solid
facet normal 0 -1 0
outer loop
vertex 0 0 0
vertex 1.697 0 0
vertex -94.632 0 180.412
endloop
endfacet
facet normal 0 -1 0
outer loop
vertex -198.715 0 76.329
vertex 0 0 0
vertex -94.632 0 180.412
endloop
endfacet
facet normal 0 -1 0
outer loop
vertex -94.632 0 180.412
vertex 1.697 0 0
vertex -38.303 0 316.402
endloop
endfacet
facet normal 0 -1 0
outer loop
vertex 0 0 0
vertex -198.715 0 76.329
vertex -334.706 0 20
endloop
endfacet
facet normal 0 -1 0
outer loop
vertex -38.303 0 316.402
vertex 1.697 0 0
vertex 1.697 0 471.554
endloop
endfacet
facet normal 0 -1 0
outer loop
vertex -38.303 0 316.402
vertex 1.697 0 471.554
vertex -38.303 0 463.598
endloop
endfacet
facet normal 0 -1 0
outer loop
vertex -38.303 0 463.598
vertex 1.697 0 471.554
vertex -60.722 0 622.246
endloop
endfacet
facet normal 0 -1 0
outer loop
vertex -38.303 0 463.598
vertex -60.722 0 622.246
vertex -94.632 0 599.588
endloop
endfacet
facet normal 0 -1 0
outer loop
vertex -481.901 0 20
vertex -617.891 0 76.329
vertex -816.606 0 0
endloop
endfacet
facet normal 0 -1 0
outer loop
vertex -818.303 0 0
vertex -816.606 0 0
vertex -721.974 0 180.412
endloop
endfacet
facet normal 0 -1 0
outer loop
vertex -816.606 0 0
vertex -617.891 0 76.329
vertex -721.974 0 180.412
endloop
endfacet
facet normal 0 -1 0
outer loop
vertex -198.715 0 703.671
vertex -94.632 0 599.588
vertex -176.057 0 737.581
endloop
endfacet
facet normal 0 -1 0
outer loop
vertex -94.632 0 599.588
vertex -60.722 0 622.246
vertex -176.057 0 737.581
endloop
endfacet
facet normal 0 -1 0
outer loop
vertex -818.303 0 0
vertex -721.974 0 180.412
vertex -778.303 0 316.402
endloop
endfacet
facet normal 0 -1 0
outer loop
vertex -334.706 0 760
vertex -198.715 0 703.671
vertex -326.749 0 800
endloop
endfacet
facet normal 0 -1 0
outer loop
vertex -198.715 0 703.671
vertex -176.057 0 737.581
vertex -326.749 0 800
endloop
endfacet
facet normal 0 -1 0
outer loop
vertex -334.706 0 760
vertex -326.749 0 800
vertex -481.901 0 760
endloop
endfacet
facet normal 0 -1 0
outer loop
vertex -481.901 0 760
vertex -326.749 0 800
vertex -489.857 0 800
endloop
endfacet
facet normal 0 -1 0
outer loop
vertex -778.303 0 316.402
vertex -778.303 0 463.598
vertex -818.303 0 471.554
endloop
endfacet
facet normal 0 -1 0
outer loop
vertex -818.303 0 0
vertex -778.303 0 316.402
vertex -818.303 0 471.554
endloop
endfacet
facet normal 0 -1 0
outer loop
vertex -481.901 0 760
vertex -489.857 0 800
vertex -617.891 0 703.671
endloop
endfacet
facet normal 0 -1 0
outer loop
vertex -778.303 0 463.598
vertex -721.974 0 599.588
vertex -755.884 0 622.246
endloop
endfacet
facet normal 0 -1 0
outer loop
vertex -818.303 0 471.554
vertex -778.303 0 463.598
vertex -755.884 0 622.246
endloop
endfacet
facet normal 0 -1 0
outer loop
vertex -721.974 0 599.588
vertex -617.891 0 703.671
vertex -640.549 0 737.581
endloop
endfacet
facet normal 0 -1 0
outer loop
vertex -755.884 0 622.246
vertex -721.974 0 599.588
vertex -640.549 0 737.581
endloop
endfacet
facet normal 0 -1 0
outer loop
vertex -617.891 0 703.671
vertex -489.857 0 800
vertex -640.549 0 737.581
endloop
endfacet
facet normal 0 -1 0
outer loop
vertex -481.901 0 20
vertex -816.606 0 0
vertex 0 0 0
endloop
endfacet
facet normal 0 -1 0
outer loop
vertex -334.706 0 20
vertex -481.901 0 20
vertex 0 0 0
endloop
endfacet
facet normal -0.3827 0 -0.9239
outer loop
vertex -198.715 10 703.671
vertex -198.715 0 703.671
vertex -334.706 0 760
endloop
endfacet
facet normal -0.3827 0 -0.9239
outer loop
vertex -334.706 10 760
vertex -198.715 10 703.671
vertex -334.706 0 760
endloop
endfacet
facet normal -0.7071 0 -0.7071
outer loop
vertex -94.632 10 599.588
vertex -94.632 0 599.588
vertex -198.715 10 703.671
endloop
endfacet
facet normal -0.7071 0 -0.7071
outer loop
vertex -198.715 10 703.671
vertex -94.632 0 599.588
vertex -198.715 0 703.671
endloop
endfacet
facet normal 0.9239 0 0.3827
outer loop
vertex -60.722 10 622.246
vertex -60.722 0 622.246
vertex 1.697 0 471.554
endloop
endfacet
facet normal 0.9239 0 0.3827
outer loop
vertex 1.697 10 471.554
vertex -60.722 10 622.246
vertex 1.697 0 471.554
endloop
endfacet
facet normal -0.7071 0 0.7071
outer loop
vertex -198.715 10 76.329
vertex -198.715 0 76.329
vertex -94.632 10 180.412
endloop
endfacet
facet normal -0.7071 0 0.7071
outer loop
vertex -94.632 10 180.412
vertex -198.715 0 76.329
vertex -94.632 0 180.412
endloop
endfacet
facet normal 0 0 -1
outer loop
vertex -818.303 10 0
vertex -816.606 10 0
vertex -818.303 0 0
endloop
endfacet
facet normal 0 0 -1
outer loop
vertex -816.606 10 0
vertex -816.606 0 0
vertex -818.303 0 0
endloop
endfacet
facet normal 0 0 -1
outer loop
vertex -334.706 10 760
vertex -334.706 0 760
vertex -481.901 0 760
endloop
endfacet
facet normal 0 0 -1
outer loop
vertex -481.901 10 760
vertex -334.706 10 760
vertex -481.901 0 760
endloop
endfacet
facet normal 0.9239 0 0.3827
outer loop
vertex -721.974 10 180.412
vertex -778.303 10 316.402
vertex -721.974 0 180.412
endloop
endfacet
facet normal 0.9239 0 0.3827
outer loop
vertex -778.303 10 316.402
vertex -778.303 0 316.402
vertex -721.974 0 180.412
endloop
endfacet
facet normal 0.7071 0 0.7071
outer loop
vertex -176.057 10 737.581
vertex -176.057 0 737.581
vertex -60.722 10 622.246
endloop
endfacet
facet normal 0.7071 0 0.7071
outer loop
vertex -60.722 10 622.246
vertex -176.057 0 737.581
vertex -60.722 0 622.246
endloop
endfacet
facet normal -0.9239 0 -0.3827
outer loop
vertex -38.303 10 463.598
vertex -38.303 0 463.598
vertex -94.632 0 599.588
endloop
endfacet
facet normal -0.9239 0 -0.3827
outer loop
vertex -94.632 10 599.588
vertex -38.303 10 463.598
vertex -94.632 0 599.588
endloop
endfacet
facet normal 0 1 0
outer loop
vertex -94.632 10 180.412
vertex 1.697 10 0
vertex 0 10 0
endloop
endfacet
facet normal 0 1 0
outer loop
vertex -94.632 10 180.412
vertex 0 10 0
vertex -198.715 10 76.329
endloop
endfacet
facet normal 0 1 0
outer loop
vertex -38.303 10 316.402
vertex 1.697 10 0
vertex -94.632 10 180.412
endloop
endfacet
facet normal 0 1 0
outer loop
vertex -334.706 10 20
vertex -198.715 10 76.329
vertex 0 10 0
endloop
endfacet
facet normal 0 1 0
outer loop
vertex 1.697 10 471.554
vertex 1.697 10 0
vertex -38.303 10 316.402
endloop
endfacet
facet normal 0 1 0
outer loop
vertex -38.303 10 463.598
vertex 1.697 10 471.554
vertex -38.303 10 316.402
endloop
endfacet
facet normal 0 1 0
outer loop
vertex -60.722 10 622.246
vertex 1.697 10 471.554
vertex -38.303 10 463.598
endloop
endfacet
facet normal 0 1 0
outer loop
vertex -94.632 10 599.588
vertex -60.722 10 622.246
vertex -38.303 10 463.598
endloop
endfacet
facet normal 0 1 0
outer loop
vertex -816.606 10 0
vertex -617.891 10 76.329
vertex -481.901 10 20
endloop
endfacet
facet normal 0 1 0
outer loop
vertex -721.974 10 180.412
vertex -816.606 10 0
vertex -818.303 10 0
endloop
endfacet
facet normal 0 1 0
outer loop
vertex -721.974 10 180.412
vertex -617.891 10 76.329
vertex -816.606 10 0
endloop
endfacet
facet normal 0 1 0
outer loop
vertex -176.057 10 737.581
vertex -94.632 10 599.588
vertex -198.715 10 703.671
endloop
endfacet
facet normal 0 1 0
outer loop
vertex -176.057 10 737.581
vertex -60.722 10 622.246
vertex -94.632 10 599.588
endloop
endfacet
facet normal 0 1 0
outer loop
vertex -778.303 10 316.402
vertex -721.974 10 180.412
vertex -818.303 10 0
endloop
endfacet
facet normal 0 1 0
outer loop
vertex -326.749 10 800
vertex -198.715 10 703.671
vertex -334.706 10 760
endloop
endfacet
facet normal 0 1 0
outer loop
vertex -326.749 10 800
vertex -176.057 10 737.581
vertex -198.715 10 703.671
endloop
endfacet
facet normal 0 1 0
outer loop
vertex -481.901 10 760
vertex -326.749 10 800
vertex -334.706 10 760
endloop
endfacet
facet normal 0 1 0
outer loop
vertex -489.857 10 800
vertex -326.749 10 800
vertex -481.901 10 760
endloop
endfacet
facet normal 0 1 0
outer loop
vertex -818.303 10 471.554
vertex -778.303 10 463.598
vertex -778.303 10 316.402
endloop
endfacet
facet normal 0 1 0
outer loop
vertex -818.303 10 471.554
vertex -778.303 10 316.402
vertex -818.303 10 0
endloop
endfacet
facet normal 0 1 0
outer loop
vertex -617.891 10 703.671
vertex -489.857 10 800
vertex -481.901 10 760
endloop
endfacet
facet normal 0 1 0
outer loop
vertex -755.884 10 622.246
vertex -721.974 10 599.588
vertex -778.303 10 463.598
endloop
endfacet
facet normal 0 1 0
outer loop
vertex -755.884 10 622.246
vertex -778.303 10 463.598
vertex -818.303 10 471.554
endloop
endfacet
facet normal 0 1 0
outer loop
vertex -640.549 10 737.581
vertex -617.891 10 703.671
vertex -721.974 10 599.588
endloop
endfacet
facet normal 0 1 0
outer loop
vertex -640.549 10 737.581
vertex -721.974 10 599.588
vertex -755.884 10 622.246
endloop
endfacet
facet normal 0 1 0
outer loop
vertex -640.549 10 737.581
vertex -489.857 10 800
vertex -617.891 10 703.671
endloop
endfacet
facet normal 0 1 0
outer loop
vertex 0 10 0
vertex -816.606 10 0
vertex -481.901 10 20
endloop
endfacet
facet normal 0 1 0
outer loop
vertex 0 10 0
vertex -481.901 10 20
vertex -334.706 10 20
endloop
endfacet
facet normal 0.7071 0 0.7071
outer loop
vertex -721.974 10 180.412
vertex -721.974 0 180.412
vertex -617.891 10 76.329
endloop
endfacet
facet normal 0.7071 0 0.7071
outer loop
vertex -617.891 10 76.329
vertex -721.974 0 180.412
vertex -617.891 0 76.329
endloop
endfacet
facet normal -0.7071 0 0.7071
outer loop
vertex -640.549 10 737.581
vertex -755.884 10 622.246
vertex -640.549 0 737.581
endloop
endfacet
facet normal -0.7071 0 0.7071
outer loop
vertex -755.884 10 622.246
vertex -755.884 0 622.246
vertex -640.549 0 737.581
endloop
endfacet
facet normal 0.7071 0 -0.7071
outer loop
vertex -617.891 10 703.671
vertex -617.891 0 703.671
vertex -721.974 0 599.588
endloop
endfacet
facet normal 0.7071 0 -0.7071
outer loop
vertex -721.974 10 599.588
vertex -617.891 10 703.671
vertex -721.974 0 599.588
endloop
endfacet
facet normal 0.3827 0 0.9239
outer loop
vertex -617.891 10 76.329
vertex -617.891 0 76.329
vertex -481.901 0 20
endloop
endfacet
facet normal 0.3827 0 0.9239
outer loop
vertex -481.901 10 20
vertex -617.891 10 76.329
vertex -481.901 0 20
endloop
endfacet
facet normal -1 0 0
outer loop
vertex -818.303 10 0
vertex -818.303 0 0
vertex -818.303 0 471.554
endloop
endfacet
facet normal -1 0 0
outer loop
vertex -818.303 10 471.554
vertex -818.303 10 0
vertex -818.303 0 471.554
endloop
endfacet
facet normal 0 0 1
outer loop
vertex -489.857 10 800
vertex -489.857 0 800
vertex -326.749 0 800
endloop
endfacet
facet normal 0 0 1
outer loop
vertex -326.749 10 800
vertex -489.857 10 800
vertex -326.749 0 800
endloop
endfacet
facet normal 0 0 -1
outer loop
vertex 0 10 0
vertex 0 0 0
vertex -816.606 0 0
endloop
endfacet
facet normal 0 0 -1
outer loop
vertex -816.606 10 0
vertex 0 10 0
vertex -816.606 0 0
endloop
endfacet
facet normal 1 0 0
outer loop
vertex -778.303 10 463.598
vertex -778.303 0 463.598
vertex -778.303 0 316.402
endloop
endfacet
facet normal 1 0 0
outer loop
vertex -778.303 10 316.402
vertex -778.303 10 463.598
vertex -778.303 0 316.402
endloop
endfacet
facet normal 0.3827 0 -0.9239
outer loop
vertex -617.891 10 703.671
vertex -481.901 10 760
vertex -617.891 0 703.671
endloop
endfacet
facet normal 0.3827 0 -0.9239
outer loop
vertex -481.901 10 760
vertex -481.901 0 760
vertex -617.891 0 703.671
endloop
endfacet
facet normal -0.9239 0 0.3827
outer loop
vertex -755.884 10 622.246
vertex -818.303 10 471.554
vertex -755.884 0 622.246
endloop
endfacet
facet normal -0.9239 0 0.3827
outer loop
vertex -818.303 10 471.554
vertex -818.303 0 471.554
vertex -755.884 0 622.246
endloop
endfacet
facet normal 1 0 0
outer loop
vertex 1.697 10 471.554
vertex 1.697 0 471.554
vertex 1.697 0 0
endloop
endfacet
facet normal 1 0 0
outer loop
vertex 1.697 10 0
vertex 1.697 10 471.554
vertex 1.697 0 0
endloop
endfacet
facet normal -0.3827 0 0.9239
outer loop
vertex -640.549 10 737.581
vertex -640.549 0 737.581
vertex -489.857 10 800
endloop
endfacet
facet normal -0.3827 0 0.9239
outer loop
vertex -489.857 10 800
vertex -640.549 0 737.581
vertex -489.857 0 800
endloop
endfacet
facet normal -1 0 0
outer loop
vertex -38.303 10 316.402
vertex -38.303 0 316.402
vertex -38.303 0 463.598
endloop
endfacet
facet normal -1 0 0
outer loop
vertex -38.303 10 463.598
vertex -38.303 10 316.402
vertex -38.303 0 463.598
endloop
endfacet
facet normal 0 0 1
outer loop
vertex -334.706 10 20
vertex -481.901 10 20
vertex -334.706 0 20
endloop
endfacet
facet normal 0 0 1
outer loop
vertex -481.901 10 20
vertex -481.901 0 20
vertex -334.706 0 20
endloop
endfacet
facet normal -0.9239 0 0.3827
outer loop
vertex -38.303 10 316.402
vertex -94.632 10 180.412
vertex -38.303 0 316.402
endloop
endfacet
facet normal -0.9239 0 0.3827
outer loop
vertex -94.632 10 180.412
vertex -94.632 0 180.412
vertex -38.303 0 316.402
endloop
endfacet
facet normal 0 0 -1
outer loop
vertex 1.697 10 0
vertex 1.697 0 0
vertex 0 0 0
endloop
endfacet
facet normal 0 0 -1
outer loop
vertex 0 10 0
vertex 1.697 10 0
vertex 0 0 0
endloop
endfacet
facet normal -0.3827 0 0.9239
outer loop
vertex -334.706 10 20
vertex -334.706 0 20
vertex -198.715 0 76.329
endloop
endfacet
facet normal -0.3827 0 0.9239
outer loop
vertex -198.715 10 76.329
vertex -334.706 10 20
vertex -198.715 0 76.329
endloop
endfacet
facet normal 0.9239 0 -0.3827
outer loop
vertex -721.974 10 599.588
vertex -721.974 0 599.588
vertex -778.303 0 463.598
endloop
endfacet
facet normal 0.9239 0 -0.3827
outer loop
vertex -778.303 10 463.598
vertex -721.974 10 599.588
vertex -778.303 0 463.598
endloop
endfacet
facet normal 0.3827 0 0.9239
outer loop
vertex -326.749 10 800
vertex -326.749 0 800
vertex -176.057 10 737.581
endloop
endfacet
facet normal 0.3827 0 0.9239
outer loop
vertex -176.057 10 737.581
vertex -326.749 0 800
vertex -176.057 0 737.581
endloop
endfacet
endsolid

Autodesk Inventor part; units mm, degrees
ref_plane "YZ Plane" through (0, 0, 0) normal (1, 0, 0) x (0, 1, 0)
ref_plane "XZ Plane" through (0, 0, 0) normal (0, 1, 0) x (-1, 0, 0)
ref_plane "XY Plane" through (0, 0, 0) normal (0, 0, 1) x (1, 0, 0)
sketch "Skizze2" plane through (0, 0, 0) normal (0, 1, 0) x (-1, 0, 0)
  line L0 (326.749, 800) -> (176.0567, 737.5812)
  line L1 (176.0567, 737.5812) -> (60.7218, 622.2463)
  line L2 (60.7218, 622.2463) -> (-1.697, 471.5541)
  line L3 (-1.697, 471.5541) -> (-1.697, 0)
  line L4 (-1.697, 0) -> (0, 0)
  line L5 (0, 0) -> (816.6061, 0)
  line L6 (816.6061, 0) -> (818.303, 0)
  line L7 (818.303, 0) -> (818.303, 471.5541)
  line L8 (818.303, 471.5541) -> (755.8842, 622.2463)
  line L9 (755.8842, 622.2463) -> (640.5494, 737.5812)
  line L10 (640.5494, 737.5812) -> (489.8571, 800)
  line L11 (489.8571, 800) -> (326.749, 800)
  line L12 (617.8912, 76.3291) -> (481.9006, 20)
  line L13 (481.9006, 20) -> (334.7055, 20)
  line L14 (334.7055, 20) -> (198.7149, 76.3291)
  line L15 (198.7149, 76.3291) -> (94.6322, 180.4118)
  line L16 (94.6322, 180.4118) -> (38.303, 316.4024)
  line L17 (38.303, 316.4024) -> (38.303, 463.5976)
  line L18 (38.303, 463.5976) -> (94.6322, 599.5882)
  line L19 (94.6322, 599.5882) -> (198.7149, 703.6709)
  line L20 (198.7149, 703.6709) -> (334.7055, 760)
  line L21 (334.7055, 760) -> (481.9006, 760)
  line L22 (481.9006, 760) -> (617.8912, 703.6709)
  line L23 (617.8912, 703.6709) -> (721.9739, 599.5882)
  line L24 (721.9739, 599.5882) -> (778.303, 463.5976)
  line L25 (778.303, 463.5976) -> (778.303, 316.4024)
  line L26 (778.303, 316.4024) -> (721.9739, 180.4118)
  line L27 (721.9739, 180.4118) -> (617.8912, 76.3291)
  point P0 (481.9006, 20)
  dimension "d89" = 157.5
  dimension "d90" = 22.5
  dimension "d91" = 135
  dimension "d92" = 90
  dimension "d93" = 90
  dimension "d94" = 40
  dimension "d95" = 780
  dimension "d96" = 820
  dimension "d97" = 800
  dimension "d98" = 760
  dimension "d99" = 20
  dimension "d100" = 40
  dimension "d101" = 780
  dimension "d102" = 740
  dimension "d103" = 780
  dimension "d104" = 40
  dimension "d105" = 780
  dimension "d106" = 740
  dimension "d107" = 780
  dimension "d108" = 40
  dimension "d109" = 780
  dimension "d110" = 740
  dimension "d111" = 780
  dimension "d112" = 818.303
  dimension "d113" = 0
  dimension "d114" = 936.4693
  dimension "d115" = 597.9763
  dimension "d116" = 974.4855
  dimension "d117" = 382.9422
  dimension "d118" = 926.5638
  dimension "d119" = 165.9378
  dimension "d120" = 0
  dimension "d121" = 0
  dimension "d122" = 0
  dimension "d123" = 471.5541
  dimension "d124" = 0
  dimension "d125" = 0
  dimension "d126" = 1.697
  dimension "d127" = 1.697
  dimension "d128" = 40
  dimension "d129" = 463.5976
  dimension "d130" = 40
  dimension "d131" = 316.4024
  dimension "d132" = 62.4188
  dimension "d133" = 62.4188
  dimension "d134" = 96.3291
  dimension "d135" = 96.3291
  dimension "d136" = 96.3291
  dimension "d137" = 96.3291
  dimension "d138" = 177.7537
  dimension "d139" = 177.7537
  dimension "d140" = 200.4118
  dimension "d141" = 200.4118
  dimension "d142" = 200.4118
  dimension "d143" = 200.4118
  dimension "d144" = 328.4459
  dimension "d145" = 328.4459
  dimension "d146" = 336.4024
  dimension "d147" = 336.4024
  dimension "d148" = 336.4024
  dimension "d149" = 336.4024
  dimension "d150" = 483.5976
  dimension "d151" = 483.5976
  dimension "d152" = 483.5976
extrude "Extrusion1" add sketch "Skizze2" along normal blind 10
properties part number "Hauptplatte"
